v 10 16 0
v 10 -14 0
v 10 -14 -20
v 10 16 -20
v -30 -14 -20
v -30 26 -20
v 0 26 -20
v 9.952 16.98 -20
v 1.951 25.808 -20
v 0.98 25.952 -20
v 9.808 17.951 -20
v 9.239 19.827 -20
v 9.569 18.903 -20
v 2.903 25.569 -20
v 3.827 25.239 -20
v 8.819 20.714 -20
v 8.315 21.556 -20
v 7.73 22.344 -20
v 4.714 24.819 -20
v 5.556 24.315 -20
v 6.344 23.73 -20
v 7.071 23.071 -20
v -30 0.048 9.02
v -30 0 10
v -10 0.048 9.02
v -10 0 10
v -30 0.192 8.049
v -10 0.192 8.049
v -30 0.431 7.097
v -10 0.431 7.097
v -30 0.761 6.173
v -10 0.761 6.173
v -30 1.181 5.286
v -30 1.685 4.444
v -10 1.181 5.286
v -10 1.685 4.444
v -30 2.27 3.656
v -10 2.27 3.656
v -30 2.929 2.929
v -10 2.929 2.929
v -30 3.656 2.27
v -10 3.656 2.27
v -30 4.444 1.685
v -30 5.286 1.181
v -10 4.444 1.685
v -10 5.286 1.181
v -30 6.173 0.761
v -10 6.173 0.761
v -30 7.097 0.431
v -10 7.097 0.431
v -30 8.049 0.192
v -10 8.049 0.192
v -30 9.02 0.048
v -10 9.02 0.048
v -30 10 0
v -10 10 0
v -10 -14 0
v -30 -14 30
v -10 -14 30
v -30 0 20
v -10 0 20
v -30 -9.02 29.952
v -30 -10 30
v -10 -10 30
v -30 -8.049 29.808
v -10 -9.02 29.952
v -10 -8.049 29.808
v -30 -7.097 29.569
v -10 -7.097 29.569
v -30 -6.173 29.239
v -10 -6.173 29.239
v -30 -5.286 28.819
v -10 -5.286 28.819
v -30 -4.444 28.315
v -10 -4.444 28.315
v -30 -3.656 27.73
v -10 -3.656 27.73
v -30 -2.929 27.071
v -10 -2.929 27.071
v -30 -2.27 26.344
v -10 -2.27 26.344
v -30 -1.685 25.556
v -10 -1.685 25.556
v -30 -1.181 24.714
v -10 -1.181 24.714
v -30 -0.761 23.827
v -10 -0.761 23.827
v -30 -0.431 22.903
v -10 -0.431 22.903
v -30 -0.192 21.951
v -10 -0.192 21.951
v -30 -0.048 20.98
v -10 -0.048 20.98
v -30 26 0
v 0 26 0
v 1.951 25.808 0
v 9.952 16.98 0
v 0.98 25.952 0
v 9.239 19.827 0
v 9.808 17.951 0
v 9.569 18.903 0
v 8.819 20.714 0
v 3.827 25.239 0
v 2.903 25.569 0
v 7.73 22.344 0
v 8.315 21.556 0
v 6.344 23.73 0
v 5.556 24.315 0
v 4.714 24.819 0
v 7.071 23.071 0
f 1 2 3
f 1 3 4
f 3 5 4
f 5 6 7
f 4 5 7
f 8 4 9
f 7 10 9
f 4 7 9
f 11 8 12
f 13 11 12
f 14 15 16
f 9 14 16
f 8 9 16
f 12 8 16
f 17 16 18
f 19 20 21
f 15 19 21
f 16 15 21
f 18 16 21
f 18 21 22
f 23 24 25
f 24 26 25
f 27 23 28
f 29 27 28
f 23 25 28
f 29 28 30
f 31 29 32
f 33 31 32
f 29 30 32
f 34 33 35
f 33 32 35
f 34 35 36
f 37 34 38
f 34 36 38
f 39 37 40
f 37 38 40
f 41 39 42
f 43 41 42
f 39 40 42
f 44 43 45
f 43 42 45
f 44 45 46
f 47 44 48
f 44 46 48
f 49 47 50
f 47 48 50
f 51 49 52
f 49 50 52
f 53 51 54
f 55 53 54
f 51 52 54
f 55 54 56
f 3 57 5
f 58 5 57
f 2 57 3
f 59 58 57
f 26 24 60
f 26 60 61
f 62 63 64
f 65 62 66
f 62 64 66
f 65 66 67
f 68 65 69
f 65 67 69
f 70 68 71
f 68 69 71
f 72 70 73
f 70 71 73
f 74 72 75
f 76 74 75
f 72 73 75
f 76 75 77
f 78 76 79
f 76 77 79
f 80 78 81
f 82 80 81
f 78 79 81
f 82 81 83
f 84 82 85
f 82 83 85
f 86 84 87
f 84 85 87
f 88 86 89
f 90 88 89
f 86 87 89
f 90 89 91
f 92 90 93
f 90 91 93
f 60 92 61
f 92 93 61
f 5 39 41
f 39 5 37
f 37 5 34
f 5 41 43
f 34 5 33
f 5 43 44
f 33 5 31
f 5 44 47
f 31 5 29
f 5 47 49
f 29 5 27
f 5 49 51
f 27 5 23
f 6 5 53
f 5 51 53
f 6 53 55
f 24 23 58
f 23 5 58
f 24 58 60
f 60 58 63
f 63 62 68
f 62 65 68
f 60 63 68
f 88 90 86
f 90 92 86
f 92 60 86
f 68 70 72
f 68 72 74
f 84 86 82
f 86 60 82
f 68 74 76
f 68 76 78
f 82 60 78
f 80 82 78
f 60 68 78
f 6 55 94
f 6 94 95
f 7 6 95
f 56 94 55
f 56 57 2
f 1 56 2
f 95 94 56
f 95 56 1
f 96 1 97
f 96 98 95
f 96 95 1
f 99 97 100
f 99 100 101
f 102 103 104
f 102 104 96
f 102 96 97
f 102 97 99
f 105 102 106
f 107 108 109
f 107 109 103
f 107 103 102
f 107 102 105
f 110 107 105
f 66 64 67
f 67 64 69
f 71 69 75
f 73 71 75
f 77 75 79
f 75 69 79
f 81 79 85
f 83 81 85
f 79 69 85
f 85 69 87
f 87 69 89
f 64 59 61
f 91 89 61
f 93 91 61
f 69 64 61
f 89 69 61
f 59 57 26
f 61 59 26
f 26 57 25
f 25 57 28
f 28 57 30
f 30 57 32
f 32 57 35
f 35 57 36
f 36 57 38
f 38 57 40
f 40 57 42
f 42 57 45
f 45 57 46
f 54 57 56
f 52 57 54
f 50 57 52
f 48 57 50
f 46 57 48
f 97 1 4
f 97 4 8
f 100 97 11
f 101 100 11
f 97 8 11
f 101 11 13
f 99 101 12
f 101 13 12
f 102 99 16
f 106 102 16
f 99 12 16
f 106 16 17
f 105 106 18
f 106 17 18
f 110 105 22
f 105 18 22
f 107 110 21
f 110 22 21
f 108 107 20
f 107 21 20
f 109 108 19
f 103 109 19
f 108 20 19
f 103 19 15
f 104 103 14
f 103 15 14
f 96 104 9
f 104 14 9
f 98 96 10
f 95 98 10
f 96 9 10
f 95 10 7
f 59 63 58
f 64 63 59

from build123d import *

# Parameters (mm, degrees)
SKETCH1_W           = 20
SKETCH1_H           = 14
BOSS_EXTRUDE1_DEPTH = 30
SKETCH2_W           = 40
SKETCH2_H           = 40
BOSS_EXTRUDE2_DEPTH = 20
FILLET1_R           = 10


with BuildPart() as part:
    # Sketch1 → Boss-Extrude1 (new body)
    with BuildSketch(Plane.XY):
        with Locations((-20, -7)):
            Rectangle(SKETCH1_W, SKETCH1_H)
    extrude(amount=BOSS_EXTRUDE1_DEPTH)

    # Sketch2 → Boss-Extrude2 (add)
    with BuildSketch(Plane.XY):
        with Locations((-10, 6)):
            Rectangle(SKETCH2_W, SKETCH2_H)
    extrude(amount=-BOSS_EXTRUDE2_DEPTH)

    # Fillet1
    fillet1_edges = [part.edges().sort_by_distance(p)[0] for p in [
        (10, 26, -10),
        (-20, 0, 30),
        (-20, 0, 0),
    ]]
    fillet(fillet1_edges, radius=FILLET1_R)


solid = part.part
